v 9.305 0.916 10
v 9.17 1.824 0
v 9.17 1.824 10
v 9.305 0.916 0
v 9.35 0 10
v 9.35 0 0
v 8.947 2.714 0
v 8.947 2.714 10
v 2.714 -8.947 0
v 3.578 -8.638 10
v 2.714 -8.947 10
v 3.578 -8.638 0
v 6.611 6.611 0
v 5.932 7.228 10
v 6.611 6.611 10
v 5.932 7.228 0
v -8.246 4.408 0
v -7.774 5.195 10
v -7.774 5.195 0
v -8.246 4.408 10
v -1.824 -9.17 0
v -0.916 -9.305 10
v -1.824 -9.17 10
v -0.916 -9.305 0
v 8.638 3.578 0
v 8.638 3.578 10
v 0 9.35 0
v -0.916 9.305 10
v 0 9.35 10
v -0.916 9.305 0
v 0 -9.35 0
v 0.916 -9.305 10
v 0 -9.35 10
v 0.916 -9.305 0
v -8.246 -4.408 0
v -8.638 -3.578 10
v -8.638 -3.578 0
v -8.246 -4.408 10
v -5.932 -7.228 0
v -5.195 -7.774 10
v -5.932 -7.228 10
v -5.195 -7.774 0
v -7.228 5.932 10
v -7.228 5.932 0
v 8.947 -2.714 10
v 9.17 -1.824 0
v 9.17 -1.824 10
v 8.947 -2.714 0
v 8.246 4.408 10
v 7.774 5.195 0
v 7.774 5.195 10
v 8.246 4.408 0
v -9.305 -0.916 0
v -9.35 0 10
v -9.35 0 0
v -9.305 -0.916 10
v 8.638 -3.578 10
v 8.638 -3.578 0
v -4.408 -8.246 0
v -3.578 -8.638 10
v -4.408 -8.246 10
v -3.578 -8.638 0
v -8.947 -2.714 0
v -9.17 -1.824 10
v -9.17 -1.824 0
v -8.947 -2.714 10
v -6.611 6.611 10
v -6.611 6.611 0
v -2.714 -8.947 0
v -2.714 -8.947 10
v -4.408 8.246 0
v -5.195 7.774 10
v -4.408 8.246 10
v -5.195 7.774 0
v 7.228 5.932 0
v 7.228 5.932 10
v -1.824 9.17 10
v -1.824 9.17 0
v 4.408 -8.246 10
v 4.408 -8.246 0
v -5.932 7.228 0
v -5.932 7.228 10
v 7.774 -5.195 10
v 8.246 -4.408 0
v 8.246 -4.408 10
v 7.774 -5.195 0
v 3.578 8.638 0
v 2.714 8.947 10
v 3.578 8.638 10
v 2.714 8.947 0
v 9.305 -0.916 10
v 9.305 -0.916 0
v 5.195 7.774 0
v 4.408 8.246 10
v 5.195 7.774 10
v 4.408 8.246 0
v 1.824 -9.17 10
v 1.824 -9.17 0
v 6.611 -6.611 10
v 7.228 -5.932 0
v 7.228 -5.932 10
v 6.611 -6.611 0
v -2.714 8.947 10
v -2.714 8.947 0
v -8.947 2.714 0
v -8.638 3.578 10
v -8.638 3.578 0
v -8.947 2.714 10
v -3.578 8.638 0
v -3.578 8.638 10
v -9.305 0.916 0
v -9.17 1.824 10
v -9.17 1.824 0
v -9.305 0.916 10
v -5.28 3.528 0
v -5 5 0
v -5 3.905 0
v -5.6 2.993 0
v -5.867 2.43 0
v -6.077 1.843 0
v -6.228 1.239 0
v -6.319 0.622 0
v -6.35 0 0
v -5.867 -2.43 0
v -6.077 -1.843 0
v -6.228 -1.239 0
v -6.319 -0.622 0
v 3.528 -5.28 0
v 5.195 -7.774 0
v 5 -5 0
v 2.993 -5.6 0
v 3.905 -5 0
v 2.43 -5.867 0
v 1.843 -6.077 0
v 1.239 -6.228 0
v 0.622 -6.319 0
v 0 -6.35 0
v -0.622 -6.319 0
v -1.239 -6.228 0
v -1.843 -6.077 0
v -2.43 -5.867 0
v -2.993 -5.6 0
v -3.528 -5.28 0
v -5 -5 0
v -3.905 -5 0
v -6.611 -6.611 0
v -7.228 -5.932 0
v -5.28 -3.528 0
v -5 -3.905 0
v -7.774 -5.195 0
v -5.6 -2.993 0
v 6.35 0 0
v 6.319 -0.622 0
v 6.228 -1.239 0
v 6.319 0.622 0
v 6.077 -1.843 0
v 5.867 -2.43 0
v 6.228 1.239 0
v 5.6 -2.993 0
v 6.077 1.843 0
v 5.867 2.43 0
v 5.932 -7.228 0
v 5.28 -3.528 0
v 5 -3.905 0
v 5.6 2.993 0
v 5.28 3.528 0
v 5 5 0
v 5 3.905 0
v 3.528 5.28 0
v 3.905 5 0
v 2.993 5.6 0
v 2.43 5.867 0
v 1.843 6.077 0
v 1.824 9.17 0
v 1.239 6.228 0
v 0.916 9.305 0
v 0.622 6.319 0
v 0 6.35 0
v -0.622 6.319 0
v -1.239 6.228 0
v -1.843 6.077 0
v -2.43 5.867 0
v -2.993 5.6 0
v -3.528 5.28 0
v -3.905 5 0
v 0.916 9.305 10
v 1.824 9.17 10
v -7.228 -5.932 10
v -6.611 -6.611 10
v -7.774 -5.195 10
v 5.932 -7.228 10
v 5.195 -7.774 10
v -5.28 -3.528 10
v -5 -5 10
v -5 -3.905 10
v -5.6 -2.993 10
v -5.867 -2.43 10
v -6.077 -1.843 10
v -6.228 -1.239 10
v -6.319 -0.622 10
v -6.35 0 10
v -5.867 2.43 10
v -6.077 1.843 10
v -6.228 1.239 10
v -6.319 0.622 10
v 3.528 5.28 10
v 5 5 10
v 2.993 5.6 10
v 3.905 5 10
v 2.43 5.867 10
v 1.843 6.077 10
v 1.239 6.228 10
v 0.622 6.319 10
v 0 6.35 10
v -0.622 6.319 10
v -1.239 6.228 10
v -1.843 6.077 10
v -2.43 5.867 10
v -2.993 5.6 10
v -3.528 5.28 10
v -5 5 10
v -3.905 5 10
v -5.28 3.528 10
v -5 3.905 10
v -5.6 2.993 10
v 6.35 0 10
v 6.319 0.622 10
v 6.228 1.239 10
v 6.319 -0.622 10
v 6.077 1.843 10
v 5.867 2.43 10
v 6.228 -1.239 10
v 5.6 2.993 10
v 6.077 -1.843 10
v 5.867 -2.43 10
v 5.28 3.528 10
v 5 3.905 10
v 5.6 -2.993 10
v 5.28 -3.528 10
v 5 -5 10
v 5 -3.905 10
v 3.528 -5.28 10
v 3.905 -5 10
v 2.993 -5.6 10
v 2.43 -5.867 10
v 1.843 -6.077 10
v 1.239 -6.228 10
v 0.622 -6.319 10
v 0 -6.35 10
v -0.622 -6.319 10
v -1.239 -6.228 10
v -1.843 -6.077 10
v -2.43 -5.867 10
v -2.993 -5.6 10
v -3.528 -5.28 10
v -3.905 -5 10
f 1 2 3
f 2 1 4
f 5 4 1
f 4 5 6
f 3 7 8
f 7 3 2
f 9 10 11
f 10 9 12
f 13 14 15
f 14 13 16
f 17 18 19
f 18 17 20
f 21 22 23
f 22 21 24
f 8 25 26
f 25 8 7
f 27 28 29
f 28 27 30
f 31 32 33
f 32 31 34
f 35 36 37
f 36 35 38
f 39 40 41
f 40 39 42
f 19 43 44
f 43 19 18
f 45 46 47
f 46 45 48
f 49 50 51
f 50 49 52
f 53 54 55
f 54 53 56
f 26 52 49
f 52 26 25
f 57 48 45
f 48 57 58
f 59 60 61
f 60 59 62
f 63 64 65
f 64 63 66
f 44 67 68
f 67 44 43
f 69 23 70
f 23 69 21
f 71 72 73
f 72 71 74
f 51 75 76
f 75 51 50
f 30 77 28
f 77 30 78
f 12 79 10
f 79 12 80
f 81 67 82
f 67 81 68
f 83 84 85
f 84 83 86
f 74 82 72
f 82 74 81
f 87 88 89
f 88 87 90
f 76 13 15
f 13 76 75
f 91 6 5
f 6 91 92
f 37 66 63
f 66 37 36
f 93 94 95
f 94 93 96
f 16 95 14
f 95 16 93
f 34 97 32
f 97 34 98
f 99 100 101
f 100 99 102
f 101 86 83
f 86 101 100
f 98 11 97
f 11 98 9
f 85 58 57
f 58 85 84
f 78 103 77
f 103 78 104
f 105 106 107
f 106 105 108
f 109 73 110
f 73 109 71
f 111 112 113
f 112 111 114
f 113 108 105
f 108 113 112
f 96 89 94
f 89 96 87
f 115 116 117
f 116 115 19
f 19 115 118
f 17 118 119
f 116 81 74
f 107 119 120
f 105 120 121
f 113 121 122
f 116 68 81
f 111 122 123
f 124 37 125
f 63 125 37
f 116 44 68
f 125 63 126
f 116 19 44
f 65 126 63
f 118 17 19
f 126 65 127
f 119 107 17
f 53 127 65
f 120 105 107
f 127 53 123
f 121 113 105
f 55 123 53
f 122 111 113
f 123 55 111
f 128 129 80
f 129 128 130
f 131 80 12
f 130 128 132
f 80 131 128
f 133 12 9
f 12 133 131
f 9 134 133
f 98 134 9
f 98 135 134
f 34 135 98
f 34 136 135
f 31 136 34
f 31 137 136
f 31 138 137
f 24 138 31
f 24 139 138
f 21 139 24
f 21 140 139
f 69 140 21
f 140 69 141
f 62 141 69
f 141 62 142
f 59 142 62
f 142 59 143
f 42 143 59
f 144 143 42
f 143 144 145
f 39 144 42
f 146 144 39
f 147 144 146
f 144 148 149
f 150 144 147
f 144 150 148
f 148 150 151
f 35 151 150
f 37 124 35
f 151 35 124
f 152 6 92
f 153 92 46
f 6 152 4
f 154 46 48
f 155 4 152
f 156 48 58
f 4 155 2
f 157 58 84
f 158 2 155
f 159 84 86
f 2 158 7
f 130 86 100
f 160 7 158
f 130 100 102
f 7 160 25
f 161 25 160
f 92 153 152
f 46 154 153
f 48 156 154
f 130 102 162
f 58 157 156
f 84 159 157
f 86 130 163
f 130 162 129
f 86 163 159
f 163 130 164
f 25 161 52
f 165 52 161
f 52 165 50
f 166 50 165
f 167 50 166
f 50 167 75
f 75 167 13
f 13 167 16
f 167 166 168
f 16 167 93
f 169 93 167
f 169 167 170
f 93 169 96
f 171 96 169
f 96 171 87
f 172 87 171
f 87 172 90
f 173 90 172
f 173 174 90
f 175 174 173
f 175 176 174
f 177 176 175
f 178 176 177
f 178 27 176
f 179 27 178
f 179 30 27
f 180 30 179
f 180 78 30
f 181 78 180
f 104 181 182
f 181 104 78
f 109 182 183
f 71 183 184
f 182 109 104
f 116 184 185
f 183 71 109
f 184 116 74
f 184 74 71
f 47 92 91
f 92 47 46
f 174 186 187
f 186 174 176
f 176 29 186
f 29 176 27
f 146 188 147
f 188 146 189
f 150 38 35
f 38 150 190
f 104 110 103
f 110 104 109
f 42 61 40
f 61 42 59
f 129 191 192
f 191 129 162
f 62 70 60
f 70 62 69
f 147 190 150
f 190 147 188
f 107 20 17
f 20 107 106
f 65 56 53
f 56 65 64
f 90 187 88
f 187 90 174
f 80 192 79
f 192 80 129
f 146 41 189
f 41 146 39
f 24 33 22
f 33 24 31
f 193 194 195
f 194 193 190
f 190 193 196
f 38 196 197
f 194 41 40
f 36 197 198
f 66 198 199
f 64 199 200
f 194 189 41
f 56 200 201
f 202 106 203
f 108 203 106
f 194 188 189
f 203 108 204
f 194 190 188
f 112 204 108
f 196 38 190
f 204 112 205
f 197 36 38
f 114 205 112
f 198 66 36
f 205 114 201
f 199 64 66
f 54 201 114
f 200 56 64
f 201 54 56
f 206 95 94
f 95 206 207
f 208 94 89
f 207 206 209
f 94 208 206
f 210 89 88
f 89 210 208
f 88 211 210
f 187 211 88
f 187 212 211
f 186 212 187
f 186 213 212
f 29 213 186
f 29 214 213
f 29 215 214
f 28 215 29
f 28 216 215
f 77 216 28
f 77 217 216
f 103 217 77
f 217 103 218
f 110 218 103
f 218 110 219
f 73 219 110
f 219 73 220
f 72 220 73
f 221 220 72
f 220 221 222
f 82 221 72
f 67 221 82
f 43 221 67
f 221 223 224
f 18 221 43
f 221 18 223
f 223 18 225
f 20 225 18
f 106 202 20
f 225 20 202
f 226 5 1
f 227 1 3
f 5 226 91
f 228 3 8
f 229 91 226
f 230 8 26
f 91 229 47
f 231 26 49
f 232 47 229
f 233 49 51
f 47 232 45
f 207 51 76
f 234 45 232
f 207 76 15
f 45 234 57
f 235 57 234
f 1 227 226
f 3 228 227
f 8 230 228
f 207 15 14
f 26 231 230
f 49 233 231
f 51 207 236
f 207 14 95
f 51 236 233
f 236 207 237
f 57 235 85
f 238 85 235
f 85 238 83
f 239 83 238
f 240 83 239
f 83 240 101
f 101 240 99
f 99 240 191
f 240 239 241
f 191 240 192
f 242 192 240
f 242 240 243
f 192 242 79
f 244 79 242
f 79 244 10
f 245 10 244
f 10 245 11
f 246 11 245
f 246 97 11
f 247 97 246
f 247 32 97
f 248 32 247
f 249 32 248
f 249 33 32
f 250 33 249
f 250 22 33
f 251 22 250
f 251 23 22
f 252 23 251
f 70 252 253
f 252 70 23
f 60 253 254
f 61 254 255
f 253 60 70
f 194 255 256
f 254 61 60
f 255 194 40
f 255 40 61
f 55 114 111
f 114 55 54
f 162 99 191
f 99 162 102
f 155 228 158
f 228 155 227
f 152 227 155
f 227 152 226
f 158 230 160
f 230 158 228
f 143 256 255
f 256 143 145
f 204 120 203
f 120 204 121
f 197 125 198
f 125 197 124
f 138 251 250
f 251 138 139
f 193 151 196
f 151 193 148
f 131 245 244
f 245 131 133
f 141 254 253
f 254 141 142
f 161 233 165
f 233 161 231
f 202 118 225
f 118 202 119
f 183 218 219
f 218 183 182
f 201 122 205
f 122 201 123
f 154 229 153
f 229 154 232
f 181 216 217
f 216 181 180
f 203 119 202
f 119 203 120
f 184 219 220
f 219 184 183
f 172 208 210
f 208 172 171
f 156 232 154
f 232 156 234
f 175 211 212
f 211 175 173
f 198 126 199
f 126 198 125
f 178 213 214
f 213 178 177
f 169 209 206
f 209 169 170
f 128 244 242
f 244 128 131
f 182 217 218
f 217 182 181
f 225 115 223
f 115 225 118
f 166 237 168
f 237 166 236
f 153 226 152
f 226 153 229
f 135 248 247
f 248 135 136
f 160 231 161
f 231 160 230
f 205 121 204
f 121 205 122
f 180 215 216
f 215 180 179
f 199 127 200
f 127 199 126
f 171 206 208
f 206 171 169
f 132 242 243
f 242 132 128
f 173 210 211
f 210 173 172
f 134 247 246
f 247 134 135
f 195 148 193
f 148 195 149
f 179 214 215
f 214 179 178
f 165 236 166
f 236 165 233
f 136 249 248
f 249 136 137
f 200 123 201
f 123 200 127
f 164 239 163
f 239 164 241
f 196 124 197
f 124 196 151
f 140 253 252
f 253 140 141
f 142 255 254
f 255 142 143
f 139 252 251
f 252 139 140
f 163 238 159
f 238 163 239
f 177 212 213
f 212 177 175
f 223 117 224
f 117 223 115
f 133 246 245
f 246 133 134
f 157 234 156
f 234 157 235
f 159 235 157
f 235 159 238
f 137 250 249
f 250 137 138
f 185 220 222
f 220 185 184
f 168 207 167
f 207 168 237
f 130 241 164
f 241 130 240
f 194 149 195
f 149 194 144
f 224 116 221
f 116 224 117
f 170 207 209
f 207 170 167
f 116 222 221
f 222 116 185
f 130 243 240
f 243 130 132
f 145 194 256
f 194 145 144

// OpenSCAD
// Snap-on Clip for Lab Stand Rod and Tubing
// Orientation: Flat on XY plane, building up in +Z.
// Units: Millimetres.

// --- Dimensions ---
// Rod Stand
$rod_diameter = 12.7;
$rod_wall_thickness = 3;
$rod_outer_diameter = $rod_diameter + 2 * $rod_wall_thickness; // 18.7
$rod_ring_height = 10;

// Tubing
$tubing_inner_diameter = 6;
$tubing_wall_thickness = 2;
$tubing_outer_diameter = $tubing_inner_diameter + 2 * $tubing_wall_thickness; // 10
$tubing_ring_height = 10;

// Bridge
$bridge_width_x = 4; // From x=8 to x=12
$bridge_width_y = 6;
$bridge_height = 10;

// Cutout Dimensions
$rod_cutout_width = 10;
$rod_cutout_y_limit = $rod_cutout_width / 2; // 5

$tubing_cutout_width = 4.5;
$tubing_cutout_y_limit = $tubing_cutout_width / 2; // 2.25

// Positioning
$rod_center_x = 0;
$rod_center_y = 0;

$tubing_center_x = 15;
$tubing_center_y = 0;

// --- Generation ---
$fn = 64;

// We build the entire part as a single difference to ensure it is one watertight body.
// We start with two solid cylinders (rings) and subtract the holes and cutouts.
// We use center=false and z=0 to ensure the part rests on the bed.

difference() {
    // 1. Rod Ring (Solid Block)
    // Centered at (0,0), height 10, from z=0 to z=10.
    translate([$rod_center_x, $rod_center_y, 0]) {
        cylinder(
            h = $rod_ring_height,
            d = $rod_outer_diameter,
            center = false
        );
    }
    
    // 2. Tubing Ring (Solid Block)
    // Centered at (15,0), height 10, from z=0 to z=10.
    translate([$tubing_center_x, $tubing_center_y, 0]) {
        cylinder(
            h = $tubing_ring_height,
            d = $tubing_outer_diameter,
            center = false
        );
    }
    
    // --- Subtractions (Holes and Cutouts) ---
    
    // 1. Rod Inner Hole
    translate([$rod_center_x, $rod_center_y, 0]) {
        cylinder(
            h = $rod_ring_height + 0.1, // Extend slightly to ensure clean cut
            d = $rod_diameter,
            center = false
        );
    }
    
    // 2. Tubing Inner Hole
    translate([$tubing_center_x, $tubing_center_y, 0]) {
        cylinder(
            h = $tubing_ring_height + 0.1,
            d = $tubing_inner_diameter,
            center = false
        );
    }
    
    // 3. Rod Cutout (-X side)
    // Region: x < 0, -5 < y < 5.
    // We subtract a block that covers this area.
    translate([-($rod_cutout_width / 2), -($rod_cutout_y_limit), 0]) {
        cube([
            $rod_cutout_width, 
            $rod_cutout_y_limit * 2, 
            $rod_ring_height + 0.1
        ]);
    }
    
    // 4. Tubing Cutout (+X side)
    // Region: x > 15, -2.25 < y < 2.25.
    translate([$tubing_center_x + ($tubing_cutout_width / 2), -($tubing_cutout_y_limit), 0]) {
        cube([
            $tubing_cutout_width, 
            $tubing_cutout_y_limit * 2, 
            $tubing_ring_height + 0.1
        ]);
    }
    
    // 5. Solid Bridge
    // Specification: 6 mm wide (Y), joins x=8 and x=12.
    // Center X = (8 + 12) / 2 = 10.
    // Width X = 4.
    // Width Y = 6.
    // Height = 10.
    // Position Z = 0.
    translate([10, 0, 0]) {
        cube([
            $bridge_width_x, 
            $bridge_width_y, 
            $bridge_height
        ]);
    }
}
